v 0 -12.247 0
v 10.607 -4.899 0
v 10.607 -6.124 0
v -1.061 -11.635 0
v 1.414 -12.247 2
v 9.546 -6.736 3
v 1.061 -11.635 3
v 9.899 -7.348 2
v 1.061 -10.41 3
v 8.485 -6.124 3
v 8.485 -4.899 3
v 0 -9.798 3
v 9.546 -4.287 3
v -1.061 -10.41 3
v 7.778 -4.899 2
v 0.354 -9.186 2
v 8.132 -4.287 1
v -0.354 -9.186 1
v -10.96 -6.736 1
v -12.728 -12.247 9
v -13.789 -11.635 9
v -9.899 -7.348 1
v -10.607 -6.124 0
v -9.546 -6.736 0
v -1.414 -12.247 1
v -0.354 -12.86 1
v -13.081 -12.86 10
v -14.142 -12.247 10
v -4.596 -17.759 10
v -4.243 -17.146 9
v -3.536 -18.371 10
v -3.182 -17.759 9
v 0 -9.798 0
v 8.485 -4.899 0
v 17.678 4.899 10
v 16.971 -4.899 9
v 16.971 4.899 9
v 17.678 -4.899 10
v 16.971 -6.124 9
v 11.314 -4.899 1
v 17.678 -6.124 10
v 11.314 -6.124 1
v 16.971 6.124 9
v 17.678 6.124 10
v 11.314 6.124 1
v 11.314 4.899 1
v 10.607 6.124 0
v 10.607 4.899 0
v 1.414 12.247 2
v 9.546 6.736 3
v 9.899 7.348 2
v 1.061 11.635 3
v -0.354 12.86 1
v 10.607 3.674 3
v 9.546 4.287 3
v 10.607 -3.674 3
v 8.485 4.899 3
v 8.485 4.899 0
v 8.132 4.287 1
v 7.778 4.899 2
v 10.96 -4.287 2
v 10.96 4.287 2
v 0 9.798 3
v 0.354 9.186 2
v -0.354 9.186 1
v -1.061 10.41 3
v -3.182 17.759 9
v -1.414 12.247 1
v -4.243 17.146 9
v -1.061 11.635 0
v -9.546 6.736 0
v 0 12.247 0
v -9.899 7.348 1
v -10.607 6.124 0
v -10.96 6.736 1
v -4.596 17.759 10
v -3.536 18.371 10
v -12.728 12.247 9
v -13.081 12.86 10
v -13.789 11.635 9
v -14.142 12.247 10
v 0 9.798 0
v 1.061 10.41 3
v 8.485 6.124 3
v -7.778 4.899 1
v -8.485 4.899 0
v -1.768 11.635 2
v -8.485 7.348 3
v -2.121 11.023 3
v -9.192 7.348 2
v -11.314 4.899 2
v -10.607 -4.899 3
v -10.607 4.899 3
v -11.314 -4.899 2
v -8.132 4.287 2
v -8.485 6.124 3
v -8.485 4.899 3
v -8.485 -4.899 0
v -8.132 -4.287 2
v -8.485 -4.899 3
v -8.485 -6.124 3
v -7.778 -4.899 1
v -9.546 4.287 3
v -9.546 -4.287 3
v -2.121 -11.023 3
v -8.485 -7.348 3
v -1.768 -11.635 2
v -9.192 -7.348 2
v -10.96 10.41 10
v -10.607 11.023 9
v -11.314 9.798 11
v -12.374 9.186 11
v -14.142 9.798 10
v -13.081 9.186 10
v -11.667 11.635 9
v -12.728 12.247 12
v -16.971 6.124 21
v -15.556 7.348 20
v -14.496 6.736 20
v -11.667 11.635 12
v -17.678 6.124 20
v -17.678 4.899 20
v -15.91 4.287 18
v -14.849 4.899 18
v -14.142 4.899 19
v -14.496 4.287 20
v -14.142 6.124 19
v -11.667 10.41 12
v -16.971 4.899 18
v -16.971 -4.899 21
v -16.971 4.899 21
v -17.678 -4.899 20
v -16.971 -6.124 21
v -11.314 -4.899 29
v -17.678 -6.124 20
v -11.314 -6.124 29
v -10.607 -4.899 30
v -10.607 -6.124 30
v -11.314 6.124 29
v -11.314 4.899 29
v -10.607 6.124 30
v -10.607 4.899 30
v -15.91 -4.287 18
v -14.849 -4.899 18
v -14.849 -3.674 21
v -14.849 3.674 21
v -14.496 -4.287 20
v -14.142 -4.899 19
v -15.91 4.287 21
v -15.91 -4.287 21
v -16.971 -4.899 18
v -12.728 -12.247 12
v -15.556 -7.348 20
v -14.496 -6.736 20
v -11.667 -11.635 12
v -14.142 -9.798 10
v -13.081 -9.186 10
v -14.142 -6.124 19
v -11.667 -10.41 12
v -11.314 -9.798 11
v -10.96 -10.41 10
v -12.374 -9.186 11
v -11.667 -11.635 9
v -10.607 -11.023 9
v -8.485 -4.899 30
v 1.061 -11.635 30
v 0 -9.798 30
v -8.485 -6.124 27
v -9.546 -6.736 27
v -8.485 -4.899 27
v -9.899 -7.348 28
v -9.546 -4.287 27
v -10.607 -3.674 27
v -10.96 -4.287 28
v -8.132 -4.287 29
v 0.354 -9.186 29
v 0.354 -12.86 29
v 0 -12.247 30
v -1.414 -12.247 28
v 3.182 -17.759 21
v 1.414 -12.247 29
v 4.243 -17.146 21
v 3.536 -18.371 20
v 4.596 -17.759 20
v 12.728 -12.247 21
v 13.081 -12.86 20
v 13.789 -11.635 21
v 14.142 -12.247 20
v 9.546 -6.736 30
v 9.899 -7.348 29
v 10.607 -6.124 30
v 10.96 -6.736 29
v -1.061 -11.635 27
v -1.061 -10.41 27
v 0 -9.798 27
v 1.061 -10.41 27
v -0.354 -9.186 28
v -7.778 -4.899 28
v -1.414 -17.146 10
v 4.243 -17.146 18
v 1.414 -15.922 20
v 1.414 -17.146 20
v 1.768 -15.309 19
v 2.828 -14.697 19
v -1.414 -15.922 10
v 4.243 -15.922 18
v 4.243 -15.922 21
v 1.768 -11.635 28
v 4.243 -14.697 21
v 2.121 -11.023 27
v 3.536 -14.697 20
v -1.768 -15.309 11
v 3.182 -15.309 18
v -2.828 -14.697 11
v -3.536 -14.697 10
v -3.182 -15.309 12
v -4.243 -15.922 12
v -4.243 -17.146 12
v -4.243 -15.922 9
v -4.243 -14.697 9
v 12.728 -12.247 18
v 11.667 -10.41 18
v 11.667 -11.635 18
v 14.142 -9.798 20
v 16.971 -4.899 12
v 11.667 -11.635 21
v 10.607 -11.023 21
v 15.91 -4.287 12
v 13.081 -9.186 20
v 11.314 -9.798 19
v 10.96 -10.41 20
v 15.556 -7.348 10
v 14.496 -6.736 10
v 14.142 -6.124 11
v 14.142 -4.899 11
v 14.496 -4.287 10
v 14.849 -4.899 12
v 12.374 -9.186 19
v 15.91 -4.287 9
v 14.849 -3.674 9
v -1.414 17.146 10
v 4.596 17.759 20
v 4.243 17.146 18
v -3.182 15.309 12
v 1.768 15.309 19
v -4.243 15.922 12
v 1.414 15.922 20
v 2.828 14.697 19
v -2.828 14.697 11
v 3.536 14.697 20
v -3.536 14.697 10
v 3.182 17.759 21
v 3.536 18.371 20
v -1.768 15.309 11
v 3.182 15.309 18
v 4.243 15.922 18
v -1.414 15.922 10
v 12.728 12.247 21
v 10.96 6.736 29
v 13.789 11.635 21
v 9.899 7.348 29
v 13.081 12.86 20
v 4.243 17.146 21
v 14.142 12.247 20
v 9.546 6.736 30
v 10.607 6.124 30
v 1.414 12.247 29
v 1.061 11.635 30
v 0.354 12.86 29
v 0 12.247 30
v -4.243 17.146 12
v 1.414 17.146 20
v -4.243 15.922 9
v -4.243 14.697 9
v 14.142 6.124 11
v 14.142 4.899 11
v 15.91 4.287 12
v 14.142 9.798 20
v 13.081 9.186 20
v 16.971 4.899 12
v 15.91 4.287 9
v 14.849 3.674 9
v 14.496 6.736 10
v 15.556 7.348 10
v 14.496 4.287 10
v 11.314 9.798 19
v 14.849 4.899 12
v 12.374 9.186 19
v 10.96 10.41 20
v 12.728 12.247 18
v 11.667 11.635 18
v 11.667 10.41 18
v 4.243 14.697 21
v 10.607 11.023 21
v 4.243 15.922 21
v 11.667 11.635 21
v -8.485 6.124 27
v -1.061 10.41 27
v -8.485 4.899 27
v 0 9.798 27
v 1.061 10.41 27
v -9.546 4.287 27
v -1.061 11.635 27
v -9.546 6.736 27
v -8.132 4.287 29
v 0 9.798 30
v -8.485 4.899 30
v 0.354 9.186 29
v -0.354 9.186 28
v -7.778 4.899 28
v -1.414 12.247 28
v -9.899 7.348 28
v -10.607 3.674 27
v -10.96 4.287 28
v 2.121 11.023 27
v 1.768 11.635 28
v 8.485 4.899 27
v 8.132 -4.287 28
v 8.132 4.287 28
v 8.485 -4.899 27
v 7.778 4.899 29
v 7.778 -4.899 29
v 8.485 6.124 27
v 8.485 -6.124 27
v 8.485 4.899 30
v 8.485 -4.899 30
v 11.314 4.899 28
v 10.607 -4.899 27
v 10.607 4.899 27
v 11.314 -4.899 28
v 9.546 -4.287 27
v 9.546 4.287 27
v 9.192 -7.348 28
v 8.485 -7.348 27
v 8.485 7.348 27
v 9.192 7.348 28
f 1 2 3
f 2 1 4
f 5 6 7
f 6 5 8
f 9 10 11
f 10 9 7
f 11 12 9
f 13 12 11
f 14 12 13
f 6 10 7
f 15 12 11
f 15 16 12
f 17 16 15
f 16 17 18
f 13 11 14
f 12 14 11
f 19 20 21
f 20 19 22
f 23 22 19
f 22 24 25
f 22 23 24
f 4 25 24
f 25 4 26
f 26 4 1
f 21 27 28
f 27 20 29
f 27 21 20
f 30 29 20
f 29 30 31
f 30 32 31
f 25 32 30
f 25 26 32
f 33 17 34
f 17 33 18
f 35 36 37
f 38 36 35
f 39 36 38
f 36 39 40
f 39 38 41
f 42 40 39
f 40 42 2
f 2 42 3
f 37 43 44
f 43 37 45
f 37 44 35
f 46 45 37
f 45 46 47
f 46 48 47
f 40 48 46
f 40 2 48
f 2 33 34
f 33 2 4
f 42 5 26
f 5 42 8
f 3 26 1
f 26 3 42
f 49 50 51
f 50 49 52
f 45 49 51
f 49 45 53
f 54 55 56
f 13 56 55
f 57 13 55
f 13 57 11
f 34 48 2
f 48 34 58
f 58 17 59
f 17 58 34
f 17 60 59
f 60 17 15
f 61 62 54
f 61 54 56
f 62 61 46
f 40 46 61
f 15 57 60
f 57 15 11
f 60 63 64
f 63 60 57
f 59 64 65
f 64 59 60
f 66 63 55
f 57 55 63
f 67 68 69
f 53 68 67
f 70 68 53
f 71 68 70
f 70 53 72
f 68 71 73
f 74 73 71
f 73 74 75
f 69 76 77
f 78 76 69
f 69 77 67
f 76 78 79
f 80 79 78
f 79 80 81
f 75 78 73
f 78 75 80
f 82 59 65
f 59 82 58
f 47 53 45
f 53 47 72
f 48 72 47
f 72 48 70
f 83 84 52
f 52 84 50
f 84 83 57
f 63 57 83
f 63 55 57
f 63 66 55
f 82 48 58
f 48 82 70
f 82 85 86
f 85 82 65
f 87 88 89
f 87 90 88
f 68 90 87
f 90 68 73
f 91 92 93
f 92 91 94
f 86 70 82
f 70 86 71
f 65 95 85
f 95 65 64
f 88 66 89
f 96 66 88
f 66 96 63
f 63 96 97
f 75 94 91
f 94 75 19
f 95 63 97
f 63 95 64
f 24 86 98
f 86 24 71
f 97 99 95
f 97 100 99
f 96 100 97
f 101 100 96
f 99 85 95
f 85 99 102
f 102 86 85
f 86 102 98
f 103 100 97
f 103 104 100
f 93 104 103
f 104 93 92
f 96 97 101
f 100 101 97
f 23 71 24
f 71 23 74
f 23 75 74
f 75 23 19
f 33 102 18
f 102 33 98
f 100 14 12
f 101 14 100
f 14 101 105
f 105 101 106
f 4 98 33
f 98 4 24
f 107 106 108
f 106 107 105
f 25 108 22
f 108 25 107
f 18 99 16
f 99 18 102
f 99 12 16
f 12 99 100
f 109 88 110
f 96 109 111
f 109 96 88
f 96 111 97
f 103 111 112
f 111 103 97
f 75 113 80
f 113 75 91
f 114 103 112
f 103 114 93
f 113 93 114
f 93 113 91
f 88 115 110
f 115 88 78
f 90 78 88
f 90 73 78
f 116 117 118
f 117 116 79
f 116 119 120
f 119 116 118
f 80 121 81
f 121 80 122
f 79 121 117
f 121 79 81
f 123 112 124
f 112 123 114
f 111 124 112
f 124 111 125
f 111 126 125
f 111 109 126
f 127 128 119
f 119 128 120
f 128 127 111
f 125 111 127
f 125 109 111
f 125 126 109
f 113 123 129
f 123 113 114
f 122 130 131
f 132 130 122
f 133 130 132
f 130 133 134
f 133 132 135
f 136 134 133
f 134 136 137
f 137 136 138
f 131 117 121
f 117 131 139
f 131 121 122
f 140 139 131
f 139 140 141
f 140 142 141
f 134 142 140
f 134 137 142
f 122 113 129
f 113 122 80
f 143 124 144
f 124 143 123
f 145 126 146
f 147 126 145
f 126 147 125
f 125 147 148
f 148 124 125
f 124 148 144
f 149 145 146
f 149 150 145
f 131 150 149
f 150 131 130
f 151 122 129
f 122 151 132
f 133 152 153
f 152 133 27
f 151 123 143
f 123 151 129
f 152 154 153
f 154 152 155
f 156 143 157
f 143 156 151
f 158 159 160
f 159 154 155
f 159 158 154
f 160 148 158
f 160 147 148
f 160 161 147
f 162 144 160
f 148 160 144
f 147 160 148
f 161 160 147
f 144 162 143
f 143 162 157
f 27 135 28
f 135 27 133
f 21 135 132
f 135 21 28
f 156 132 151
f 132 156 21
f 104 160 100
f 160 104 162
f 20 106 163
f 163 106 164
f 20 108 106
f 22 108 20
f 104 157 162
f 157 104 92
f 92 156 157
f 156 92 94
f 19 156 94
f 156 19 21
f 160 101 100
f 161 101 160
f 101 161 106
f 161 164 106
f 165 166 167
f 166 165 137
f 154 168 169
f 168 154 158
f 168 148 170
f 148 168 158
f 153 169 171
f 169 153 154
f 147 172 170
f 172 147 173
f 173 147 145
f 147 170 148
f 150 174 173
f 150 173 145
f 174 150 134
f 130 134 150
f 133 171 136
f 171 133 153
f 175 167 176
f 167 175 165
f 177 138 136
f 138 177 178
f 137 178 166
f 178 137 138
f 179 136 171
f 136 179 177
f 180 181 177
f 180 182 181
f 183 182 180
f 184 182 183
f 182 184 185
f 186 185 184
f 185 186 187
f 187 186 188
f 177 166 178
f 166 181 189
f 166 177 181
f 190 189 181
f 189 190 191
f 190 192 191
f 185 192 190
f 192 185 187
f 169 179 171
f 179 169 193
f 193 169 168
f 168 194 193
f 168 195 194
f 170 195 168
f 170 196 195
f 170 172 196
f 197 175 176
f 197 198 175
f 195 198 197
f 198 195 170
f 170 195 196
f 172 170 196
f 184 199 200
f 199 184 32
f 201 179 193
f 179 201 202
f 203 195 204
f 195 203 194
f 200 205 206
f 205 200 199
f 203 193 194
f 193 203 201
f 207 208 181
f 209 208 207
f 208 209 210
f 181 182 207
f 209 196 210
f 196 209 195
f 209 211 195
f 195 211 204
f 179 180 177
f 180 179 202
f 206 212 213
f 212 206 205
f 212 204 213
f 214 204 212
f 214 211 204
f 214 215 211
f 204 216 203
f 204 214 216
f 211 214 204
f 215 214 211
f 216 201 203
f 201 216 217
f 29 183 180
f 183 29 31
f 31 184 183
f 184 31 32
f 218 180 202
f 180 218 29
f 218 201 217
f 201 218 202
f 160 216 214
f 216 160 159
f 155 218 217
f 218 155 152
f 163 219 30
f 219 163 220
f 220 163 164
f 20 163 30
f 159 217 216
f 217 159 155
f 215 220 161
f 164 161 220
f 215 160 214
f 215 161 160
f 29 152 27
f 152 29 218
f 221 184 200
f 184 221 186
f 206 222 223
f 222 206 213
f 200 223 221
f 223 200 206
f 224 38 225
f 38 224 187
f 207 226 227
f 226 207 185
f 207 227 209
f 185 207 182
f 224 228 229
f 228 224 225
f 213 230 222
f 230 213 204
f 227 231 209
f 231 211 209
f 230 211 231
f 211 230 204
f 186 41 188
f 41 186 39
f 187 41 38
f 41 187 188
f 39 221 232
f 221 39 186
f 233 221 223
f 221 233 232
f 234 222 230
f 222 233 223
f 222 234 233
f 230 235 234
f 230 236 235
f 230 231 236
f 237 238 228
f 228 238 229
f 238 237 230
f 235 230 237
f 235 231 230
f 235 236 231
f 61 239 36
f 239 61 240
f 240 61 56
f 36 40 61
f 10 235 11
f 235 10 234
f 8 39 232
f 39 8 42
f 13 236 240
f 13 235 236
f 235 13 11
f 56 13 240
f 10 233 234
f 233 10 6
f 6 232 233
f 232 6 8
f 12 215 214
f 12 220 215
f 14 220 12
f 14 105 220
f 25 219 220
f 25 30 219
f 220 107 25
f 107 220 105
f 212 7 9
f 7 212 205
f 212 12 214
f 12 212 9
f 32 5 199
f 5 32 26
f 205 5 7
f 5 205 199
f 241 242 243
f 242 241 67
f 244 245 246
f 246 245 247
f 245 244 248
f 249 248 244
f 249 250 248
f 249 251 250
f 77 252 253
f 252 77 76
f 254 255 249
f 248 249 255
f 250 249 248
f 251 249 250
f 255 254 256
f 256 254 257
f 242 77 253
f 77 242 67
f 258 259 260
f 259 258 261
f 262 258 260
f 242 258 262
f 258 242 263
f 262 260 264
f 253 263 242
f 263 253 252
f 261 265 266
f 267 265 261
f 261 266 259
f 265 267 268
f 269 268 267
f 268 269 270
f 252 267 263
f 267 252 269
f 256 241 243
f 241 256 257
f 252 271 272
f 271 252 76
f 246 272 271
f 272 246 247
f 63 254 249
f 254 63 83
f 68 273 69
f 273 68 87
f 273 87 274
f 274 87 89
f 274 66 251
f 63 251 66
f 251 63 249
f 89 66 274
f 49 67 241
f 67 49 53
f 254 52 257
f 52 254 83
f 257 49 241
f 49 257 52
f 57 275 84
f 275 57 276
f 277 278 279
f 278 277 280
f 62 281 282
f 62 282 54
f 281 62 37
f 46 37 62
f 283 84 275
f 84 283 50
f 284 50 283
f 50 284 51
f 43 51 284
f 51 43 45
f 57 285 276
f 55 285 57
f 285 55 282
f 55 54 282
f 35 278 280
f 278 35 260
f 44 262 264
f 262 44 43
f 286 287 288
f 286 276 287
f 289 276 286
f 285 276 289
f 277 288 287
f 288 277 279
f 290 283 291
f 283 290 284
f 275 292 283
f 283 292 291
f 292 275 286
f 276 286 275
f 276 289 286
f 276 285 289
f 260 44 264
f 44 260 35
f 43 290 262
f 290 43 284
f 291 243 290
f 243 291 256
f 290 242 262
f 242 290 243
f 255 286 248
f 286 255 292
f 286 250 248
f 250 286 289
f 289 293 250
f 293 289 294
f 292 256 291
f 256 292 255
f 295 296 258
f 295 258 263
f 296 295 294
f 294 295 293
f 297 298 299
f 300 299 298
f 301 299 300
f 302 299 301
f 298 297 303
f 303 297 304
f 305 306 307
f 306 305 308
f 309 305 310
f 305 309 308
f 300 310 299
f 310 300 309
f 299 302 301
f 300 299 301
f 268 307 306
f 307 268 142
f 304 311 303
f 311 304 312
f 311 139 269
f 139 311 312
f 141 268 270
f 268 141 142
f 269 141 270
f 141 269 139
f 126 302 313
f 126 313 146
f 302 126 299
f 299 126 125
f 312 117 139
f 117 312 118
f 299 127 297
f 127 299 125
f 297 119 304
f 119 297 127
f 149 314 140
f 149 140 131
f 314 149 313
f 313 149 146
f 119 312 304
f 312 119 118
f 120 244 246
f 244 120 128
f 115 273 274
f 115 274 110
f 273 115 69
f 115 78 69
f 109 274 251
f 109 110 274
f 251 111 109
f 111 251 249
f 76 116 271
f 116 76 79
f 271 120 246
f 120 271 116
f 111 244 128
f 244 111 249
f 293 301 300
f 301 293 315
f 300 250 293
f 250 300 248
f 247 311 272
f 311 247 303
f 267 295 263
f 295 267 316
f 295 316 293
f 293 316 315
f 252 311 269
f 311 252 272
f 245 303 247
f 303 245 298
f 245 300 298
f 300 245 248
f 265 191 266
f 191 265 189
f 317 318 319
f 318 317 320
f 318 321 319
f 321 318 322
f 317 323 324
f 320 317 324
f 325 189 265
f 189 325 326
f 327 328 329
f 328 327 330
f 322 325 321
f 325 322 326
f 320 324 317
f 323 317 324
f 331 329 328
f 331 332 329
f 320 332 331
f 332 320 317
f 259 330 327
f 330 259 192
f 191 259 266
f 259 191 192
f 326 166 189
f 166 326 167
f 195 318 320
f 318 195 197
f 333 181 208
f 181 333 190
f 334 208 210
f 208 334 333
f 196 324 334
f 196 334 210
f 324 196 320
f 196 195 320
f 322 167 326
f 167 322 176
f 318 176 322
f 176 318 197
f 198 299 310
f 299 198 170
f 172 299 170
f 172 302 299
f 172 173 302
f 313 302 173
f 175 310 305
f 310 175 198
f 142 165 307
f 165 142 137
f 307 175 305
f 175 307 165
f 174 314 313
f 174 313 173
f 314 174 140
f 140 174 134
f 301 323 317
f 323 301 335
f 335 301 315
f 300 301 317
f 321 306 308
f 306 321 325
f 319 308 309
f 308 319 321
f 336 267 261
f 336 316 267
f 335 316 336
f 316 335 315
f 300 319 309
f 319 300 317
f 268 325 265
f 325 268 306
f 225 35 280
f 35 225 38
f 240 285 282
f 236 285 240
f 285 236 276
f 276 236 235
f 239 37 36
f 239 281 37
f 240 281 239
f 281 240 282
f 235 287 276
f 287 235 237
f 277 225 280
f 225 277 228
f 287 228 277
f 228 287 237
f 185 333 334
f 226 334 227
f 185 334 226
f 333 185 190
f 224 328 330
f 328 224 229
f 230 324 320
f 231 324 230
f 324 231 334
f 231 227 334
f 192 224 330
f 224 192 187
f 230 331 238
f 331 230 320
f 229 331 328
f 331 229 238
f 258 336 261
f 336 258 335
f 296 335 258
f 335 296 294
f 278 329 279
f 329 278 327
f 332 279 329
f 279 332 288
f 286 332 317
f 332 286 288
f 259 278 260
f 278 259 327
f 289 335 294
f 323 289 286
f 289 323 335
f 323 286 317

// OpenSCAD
// shape height
sh = 30;
// border width
bw = 3;

tr = 1/3; // truncation ratio

translate([0, 0, sh / 2]) 
    toface_rotate() 
        trucated_octahedron1();

// ------------ octahedron ------------

// octahedron vertices
overt = [
    [0, 0, -1], // 0
    [1, 0, 0], // 1
    [0, 1, 0], // 2
    [-1, 0, 0], // 3
    [0, -1, 0], // 4
    [0, 0, 1] // 5
];

oface = [
    [0, 1, 2],
    [0, 2, 3],
    [0, 3, 4],
    [0, 4, 1],
    [5, 2, 1],
    [5, 3, 2],
    [5, 4, 3],
    [5, 1, 4]
];

// ------------ truncated octahedron ------------

// vertice pairs
tovp = [
    for (f = oface) 
        for (i = [0:2])
            let(j = (i + 1) % 3)
                [f[i], f[j]]
];

tovert = [
    for (p = tovp) 
        let(a = overt[p[0]])
        let(b = overt[p[1]])
            a + tr * (b - a)
];
        
function tovn(u, v) =
    search([[u, v]], tovp)[0];         
        
// hexagonal faces        
toface_h = [
    for (f = oface) [
        for (t = [0:5])
            let(i = t / 2)
            let(j = (i + 1) % 3)
                t % 2 == 0 ? tovn(f[i], f[j]) : tovn(f[j], f[i])
    ]
];        
  
// rectangular faces (TBD -- not computed now)       
toface_r = [
/*        
    for (i = [0:7]) [
        for (f = oface) 
            for (j = [0:2])
                if (f[j] == i)
                    let(k = (j + 1) % 3)
                        tovn(i, f[k])
    ]
*/        
];        
        
toface = concat(toface_h, toface_r);
        

tof0c = (tovert[0] + tovert[1] + tovert[2]) / 3;
tofr = norm(tof0c);
tofax = atan(tof0c.y / tof0c.z);

tof0rx = tof0c * [
    [1, 0, 0],
    [0, cos(tofax), -sin(tofax)],
    [0, sin(tofax), cos(tofax)]
];


tofay = atan(tof0rx.x / tof0rx.y);

module toface_rotate() {    
    rotate([tofax, tofay, 0]) children();
}

module trucated_octahedron0() {
    scale(bw / 2 / tofr) hull() polyhedron(tovert, toface);    
}

module trucated_octahedron1() {
    s = (sh - bw) / 2 / tofr;
    for (f = toface_h) {
        for (i = [0:5]) {
            j = (i + 1) % 6;
            p = f[i];
            q = f[j];
            hull() {
                translate(tovert[p] * s) trucated_octahedron0();
                translate(tovert[q] * s) trucated_octahedron0();
            }                
        }
    }        
}
